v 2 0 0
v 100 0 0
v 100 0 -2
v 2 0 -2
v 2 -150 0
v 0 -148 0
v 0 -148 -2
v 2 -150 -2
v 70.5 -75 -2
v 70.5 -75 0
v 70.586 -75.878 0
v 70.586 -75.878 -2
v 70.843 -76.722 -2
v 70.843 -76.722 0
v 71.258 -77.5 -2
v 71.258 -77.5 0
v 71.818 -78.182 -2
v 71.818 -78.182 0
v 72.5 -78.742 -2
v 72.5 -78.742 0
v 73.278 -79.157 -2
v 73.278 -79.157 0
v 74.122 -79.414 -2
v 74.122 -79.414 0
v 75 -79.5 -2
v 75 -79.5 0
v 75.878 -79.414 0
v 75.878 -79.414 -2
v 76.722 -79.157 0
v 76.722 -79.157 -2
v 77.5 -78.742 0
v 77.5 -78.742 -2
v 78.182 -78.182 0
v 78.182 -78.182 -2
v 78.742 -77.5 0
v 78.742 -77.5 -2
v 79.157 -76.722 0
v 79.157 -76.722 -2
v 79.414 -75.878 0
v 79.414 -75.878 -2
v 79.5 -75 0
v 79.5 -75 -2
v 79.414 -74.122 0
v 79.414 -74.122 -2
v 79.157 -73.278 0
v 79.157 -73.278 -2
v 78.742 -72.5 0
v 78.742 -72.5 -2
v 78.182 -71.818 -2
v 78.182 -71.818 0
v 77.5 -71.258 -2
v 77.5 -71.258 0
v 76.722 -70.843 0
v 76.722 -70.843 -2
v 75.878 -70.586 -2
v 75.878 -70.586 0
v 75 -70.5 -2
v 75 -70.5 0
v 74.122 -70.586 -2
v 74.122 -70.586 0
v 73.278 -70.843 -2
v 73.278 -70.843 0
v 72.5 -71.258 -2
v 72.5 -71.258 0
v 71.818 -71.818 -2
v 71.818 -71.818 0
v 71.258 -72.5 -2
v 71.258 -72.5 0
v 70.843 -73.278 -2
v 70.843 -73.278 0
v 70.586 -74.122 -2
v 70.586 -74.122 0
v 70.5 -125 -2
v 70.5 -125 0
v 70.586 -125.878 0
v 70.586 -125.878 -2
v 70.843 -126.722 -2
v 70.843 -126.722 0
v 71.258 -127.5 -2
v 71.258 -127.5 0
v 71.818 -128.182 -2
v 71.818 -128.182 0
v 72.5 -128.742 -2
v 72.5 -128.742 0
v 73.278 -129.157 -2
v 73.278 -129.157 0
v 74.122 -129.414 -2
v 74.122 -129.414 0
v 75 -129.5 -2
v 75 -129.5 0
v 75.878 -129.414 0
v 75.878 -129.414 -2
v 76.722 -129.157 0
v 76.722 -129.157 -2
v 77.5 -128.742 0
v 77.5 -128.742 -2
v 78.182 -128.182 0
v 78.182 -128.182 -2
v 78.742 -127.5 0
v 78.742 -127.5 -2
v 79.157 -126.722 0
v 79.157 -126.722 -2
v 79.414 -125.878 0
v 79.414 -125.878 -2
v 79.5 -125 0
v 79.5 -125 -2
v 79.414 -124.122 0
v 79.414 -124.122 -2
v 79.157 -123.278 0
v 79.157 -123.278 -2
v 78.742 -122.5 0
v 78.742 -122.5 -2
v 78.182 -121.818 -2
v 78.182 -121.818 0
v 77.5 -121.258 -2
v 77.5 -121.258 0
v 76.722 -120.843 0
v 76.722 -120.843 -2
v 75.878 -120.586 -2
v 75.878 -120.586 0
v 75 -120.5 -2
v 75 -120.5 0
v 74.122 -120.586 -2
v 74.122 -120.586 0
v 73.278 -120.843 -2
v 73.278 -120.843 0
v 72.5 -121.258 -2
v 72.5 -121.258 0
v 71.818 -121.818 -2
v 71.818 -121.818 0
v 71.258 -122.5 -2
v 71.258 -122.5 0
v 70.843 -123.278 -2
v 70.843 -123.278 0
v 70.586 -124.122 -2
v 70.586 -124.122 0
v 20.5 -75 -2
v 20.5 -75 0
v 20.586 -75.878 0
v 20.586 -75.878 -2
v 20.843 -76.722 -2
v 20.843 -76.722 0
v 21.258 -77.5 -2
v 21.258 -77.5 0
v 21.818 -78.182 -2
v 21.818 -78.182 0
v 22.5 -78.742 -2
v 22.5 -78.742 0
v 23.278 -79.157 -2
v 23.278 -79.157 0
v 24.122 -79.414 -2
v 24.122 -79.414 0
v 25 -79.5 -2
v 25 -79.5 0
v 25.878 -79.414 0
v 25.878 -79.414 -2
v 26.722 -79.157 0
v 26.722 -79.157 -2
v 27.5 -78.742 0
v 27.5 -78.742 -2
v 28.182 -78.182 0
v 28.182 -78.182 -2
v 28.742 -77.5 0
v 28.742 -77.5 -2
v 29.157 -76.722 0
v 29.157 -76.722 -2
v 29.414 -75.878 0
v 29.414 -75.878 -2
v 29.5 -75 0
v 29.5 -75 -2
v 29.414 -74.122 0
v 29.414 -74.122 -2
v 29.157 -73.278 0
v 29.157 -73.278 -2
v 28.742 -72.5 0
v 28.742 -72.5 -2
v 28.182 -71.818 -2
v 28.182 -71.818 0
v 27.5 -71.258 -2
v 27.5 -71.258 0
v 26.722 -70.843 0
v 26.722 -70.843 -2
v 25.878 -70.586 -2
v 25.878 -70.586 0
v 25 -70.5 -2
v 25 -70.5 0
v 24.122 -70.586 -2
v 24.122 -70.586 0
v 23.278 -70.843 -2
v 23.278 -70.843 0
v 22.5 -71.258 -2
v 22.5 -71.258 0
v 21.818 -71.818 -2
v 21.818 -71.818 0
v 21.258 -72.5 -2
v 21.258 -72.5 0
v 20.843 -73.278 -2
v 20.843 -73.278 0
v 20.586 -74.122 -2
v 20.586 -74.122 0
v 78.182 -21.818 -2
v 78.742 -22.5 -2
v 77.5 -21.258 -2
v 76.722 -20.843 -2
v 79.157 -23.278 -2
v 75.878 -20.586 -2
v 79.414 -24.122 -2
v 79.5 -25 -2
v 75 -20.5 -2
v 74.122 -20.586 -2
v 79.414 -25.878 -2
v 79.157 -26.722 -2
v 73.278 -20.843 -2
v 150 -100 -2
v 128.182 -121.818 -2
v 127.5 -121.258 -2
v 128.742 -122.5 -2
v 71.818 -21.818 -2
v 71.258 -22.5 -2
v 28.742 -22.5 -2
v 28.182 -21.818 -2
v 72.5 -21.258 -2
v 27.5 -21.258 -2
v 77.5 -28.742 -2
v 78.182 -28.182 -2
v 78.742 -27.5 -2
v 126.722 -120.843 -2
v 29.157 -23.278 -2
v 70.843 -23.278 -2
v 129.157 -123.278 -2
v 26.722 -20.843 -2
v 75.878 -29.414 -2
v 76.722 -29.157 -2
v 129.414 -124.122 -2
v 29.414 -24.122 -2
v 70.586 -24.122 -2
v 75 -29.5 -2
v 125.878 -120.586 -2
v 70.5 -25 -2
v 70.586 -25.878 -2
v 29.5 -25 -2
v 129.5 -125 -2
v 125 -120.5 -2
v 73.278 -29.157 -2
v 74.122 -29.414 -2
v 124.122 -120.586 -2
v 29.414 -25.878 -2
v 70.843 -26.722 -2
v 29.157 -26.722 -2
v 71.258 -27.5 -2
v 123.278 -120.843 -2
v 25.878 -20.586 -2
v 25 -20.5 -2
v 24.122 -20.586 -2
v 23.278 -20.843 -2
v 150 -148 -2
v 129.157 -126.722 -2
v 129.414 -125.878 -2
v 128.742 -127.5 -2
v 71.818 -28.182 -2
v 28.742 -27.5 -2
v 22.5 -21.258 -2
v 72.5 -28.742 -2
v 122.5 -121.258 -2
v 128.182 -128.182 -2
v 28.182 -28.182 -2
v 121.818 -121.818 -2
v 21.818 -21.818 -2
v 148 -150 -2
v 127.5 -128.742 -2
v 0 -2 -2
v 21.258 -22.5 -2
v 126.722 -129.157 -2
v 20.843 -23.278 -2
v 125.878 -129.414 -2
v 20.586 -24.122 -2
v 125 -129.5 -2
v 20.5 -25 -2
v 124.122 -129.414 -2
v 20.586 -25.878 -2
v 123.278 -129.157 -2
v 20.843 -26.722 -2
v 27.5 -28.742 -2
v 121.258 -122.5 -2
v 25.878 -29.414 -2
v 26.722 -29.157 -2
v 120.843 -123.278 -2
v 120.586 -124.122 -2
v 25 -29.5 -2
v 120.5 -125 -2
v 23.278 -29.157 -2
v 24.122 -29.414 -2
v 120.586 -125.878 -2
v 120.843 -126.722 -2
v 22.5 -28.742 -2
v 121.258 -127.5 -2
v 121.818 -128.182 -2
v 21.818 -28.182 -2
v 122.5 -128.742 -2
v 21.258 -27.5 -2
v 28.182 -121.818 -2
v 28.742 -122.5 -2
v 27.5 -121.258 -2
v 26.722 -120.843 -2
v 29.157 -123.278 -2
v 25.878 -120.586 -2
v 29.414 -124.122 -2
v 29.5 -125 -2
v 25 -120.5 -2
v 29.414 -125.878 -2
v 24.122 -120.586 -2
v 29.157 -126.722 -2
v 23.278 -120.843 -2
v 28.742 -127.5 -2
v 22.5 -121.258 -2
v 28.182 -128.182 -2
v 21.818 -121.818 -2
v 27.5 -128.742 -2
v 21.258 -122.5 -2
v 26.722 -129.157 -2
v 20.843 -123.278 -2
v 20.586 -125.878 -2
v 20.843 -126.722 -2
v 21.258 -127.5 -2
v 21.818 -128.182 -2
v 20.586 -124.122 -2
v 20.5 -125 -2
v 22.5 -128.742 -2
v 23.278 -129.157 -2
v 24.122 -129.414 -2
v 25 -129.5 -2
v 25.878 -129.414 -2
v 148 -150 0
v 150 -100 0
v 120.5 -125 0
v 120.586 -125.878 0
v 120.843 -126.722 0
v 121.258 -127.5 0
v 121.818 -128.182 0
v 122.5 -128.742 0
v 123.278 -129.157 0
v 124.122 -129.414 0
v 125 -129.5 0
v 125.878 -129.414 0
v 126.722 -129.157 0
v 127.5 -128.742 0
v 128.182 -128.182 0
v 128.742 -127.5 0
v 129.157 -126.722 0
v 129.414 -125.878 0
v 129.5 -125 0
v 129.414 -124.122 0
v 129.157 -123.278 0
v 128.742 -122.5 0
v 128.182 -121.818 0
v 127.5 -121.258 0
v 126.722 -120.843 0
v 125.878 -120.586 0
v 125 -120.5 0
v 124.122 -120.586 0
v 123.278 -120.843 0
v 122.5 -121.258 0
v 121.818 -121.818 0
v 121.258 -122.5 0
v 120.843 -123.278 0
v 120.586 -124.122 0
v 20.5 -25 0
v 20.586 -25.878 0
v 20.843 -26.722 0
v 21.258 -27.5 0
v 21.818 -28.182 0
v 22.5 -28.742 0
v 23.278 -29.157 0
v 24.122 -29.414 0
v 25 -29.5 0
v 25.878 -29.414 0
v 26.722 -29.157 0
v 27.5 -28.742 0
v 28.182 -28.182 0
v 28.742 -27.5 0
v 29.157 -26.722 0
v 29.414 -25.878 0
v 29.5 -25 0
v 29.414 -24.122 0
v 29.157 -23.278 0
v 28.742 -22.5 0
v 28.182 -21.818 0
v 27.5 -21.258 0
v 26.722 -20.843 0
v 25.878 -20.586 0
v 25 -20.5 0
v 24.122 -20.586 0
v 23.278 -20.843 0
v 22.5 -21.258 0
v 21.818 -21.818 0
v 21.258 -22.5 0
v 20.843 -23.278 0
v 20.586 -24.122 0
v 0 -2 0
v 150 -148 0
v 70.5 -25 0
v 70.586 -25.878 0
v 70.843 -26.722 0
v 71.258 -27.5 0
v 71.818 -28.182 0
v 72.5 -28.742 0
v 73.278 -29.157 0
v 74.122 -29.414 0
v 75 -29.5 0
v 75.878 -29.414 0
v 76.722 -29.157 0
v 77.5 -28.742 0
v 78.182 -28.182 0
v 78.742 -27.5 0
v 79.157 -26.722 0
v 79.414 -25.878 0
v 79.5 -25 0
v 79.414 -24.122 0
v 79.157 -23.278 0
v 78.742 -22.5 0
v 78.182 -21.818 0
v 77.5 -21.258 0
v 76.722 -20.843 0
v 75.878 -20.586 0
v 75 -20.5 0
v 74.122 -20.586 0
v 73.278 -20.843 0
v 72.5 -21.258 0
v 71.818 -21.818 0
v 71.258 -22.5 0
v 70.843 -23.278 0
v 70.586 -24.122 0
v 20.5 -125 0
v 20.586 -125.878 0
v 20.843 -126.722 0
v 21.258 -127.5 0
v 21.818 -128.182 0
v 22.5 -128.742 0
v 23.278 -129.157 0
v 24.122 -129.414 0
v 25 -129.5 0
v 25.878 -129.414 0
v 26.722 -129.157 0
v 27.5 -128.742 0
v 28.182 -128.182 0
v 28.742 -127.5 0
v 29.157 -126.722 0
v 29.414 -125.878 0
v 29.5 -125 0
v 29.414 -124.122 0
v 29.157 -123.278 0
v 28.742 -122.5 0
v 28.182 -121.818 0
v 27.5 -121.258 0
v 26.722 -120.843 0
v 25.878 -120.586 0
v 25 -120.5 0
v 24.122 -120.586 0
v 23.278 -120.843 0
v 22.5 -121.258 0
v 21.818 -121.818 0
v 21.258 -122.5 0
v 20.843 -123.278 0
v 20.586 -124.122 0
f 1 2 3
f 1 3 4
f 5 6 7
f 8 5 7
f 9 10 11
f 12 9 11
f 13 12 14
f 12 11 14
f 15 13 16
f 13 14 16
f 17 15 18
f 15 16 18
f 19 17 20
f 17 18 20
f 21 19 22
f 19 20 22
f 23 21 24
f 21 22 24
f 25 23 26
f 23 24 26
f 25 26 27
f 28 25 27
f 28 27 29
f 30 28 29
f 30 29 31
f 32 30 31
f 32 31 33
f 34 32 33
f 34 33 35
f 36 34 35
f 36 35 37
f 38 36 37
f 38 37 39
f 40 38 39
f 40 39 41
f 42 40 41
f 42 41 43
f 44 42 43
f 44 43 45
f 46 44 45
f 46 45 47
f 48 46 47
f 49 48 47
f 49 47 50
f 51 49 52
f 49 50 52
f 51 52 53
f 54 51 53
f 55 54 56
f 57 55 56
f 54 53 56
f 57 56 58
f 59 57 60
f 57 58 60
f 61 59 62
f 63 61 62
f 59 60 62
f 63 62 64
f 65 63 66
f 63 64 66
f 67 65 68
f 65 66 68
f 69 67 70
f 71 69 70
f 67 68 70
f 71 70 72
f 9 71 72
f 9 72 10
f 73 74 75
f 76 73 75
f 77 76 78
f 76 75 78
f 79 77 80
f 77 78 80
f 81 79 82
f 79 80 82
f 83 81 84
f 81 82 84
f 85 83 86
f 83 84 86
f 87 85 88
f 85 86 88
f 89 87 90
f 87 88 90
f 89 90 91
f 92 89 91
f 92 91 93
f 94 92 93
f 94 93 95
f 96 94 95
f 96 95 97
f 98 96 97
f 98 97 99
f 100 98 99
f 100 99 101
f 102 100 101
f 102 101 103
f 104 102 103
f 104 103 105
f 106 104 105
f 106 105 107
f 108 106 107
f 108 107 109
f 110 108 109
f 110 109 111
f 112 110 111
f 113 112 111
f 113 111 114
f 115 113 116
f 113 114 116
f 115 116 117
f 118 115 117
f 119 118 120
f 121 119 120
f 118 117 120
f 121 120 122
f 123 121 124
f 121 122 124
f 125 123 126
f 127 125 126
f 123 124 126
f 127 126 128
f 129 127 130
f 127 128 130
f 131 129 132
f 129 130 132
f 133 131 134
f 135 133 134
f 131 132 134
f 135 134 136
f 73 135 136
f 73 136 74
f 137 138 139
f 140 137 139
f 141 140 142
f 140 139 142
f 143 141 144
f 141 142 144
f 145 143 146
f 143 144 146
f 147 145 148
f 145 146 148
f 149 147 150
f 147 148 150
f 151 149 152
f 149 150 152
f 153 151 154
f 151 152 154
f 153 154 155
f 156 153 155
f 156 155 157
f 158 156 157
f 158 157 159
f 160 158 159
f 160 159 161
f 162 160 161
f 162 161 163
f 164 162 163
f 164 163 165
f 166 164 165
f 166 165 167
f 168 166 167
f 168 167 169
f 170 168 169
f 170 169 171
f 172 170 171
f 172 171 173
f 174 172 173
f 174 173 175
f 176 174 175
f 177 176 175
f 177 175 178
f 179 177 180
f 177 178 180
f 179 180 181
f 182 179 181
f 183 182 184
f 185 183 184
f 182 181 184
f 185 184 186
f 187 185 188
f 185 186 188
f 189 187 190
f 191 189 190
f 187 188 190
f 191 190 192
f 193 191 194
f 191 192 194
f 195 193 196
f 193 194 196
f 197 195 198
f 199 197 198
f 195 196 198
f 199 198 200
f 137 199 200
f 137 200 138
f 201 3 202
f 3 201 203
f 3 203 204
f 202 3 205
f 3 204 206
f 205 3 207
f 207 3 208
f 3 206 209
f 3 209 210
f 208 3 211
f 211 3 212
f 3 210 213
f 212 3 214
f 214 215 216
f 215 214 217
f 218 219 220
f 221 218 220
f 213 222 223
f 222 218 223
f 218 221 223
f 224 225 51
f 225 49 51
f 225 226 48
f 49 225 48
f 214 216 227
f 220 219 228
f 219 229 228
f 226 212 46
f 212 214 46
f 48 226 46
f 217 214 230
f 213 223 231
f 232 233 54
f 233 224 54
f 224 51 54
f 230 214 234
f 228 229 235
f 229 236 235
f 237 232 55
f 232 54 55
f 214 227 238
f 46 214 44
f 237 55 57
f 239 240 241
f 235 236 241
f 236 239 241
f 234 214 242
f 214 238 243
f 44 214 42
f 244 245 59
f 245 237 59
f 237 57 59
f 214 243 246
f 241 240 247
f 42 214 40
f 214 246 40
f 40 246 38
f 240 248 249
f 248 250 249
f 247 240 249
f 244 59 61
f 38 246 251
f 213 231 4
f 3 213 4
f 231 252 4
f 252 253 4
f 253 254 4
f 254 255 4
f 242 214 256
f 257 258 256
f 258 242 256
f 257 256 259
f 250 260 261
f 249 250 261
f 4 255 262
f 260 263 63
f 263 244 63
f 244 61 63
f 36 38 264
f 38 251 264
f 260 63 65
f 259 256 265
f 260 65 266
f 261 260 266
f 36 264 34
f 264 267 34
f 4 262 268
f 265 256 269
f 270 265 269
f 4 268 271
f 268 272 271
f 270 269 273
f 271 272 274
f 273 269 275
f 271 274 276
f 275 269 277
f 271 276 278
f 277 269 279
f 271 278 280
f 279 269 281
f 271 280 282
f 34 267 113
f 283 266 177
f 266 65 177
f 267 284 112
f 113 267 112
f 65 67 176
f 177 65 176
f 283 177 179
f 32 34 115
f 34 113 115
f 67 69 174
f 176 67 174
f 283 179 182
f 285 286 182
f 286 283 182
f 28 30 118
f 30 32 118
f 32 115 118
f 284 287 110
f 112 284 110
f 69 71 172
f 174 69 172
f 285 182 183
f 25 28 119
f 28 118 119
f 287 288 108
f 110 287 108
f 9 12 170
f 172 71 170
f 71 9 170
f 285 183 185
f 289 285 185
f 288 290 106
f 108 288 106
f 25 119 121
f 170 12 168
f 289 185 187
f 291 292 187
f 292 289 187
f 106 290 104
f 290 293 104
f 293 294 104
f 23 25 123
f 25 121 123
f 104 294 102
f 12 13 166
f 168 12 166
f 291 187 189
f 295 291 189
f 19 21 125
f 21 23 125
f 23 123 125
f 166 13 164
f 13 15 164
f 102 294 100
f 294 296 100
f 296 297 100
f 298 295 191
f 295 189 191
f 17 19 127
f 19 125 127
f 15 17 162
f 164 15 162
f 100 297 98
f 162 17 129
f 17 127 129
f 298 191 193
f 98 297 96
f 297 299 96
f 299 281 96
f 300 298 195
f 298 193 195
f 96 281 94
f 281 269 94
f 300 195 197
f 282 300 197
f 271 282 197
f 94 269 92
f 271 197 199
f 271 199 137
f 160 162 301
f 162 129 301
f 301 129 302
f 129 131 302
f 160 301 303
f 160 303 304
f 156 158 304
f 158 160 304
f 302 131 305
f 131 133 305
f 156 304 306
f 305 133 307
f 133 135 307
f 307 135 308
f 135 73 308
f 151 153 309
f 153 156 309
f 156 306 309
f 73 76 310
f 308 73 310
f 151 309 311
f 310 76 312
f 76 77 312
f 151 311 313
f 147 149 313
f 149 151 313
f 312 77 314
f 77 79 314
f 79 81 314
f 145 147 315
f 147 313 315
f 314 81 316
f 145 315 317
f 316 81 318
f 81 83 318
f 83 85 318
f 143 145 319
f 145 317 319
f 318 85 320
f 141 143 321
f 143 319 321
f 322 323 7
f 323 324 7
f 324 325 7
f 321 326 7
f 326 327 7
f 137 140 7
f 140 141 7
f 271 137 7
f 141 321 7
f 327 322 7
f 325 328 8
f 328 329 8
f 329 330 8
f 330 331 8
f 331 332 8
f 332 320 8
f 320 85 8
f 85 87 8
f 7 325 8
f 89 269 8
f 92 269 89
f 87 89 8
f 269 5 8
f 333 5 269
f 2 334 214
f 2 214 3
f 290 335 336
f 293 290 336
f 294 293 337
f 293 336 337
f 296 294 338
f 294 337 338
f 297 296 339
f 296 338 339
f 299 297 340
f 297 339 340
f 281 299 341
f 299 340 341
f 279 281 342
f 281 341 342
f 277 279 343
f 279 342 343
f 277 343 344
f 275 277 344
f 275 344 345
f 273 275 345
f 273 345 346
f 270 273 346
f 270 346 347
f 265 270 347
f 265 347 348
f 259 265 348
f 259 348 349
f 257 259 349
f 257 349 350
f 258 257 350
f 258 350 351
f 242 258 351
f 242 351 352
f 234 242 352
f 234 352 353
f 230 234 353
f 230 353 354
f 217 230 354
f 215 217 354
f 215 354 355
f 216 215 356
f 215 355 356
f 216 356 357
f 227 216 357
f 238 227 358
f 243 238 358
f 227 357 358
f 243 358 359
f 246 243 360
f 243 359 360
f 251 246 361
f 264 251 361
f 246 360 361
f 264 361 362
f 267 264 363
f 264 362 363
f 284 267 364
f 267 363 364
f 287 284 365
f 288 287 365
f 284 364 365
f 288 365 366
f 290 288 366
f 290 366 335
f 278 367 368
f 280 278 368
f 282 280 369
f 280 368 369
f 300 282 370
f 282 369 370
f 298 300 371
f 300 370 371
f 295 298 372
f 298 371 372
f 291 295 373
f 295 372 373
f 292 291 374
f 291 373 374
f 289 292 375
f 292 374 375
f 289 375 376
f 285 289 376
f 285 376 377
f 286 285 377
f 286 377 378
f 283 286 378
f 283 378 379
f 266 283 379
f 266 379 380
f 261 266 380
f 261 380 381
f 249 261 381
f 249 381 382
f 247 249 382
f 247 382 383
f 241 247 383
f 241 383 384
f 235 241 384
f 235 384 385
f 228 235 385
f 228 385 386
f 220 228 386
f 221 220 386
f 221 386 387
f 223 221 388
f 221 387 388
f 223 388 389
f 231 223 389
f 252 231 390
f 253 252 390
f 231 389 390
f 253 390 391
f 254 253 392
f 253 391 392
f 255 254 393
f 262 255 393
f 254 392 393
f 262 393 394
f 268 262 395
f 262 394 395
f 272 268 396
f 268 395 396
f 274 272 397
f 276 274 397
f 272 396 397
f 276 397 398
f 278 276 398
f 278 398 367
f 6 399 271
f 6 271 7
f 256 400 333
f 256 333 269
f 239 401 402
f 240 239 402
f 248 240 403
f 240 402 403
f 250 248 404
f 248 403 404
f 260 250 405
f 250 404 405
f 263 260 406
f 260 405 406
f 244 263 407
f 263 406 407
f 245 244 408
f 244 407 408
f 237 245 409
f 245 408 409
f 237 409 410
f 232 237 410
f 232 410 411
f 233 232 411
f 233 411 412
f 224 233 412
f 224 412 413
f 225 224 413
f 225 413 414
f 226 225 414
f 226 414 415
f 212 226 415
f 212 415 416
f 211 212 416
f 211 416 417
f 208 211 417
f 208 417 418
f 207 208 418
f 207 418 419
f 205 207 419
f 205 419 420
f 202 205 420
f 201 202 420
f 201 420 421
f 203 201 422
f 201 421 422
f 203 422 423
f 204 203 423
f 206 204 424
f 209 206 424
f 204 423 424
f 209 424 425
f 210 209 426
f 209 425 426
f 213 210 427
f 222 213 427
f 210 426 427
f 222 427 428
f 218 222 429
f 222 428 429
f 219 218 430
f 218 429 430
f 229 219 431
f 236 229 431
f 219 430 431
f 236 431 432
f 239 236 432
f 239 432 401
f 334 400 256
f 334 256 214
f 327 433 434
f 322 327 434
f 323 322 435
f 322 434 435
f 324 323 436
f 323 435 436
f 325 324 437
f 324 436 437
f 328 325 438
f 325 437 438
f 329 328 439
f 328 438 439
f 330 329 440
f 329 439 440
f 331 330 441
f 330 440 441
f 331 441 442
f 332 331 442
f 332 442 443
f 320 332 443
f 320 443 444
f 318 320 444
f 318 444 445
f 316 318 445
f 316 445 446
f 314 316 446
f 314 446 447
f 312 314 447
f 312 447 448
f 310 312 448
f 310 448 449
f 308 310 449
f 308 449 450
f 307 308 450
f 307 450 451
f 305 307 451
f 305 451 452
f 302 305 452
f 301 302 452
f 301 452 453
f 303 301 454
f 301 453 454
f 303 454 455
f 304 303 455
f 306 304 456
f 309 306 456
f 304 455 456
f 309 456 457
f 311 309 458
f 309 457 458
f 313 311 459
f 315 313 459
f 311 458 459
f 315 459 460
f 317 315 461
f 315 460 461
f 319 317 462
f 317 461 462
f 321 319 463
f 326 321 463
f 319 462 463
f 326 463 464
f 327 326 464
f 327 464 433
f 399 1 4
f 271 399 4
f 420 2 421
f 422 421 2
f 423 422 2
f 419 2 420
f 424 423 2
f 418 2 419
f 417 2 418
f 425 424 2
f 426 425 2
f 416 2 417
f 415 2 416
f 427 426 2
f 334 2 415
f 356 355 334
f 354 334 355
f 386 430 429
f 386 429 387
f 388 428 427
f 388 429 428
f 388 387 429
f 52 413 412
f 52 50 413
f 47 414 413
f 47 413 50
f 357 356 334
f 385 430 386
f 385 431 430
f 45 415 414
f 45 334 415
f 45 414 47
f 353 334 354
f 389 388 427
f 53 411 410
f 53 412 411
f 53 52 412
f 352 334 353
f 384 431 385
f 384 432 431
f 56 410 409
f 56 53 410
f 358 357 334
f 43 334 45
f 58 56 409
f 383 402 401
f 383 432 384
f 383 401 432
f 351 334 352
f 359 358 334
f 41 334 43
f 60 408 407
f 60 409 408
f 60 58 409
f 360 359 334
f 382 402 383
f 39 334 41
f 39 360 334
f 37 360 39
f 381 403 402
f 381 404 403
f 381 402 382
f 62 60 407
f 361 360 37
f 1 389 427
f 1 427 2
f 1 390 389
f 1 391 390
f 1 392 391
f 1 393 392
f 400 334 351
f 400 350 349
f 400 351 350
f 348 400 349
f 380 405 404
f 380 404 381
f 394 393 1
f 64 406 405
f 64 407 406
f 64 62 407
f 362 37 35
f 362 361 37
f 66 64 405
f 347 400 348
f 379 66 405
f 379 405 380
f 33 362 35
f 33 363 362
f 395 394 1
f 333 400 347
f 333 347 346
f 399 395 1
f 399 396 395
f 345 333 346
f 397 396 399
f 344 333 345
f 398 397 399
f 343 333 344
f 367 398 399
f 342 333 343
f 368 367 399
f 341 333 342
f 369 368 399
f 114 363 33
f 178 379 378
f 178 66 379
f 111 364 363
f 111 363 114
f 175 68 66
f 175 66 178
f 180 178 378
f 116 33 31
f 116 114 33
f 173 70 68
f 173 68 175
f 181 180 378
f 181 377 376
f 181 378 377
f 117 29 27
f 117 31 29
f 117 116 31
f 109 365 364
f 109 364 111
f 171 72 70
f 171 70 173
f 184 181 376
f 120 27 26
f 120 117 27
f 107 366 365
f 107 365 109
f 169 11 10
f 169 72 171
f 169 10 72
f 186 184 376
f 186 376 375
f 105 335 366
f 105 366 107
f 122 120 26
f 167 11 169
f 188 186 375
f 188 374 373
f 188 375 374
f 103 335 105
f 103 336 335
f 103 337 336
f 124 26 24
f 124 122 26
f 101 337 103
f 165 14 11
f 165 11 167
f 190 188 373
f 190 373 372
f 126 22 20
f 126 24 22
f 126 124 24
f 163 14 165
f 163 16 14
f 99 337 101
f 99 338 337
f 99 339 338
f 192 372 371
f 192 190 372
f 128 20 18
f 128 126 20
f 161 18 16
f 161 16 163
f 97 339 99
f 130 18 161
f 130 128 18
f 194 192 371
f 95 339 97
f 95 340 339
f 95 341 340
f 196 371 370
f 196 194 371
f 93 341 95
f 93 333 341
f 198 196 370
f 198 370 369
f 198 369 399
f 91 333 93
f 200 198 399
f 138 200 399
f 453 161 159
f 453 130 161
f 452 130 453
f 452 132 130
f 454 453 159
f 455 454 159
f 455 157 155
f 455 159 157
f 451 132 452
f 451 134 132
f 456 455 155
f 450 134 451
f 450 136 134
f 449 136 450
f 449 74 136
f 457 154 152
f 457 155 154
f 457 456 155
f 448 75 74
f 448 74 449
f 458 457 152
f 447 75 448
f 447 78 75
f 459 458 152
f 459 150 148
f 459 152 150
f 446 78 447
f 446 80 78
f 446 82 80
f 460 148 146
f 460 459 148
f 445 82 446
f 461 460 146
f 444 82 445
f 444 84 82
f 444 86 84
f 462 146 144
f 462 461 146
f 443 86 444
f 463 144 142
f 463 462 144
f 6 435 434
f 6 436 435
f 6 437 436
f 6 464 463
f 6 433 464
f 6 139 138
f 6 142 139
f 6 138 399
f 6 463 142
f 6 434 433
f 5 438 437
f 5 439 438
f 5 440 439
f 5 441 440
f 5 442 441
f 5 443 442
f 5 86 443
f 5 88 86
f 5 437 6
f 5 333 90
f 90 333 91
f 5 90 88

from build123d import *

# Parameters (mm, degrees)
EXTRUDE_1_DEPTH   = 2
HOLE_WIZARD_M81_D = 9
CHAMFER_1_SIZE    = 2


with BuildPart() as part:
    # Эскиз1 → Бобышка-Вытянуть1 (new body)
    with BuildSketch(Plane(origin=(0, 0, 0), x_dir=(1, 0, 0), z_dir=(0, 0, -1))):
        Polygon((0, 0), (0, 150), (150, 150), (150, 100), (100, 0), align=None)
    extrude(amount=EXTRUDE_1_DEPTH)

    # Отверстие с зазором M81 (through all)
    with Locations(Plane(origin=(0, 0, -2), x_dir=(1, 0, 0), z_dir=(0, 0, -1))):
        with Locations((75, 125), (25, 125), (25, 75), (25, 25), (125, 125), (75, 75), (75, 25)):
            Hole(HOLE_WIZARD_M81_D / 2)

    # Фаска1
    chamfer_1_edges = [part.edges().sort_by_distance(p)[0] for p in [
        (0, 0, -1),
        (0, -150, -1),
        (150, -150, -1),
    ]]
    chamfer(chamfer_1_edges, length=CHAMFER_1_SIZE)


solid = part.part
